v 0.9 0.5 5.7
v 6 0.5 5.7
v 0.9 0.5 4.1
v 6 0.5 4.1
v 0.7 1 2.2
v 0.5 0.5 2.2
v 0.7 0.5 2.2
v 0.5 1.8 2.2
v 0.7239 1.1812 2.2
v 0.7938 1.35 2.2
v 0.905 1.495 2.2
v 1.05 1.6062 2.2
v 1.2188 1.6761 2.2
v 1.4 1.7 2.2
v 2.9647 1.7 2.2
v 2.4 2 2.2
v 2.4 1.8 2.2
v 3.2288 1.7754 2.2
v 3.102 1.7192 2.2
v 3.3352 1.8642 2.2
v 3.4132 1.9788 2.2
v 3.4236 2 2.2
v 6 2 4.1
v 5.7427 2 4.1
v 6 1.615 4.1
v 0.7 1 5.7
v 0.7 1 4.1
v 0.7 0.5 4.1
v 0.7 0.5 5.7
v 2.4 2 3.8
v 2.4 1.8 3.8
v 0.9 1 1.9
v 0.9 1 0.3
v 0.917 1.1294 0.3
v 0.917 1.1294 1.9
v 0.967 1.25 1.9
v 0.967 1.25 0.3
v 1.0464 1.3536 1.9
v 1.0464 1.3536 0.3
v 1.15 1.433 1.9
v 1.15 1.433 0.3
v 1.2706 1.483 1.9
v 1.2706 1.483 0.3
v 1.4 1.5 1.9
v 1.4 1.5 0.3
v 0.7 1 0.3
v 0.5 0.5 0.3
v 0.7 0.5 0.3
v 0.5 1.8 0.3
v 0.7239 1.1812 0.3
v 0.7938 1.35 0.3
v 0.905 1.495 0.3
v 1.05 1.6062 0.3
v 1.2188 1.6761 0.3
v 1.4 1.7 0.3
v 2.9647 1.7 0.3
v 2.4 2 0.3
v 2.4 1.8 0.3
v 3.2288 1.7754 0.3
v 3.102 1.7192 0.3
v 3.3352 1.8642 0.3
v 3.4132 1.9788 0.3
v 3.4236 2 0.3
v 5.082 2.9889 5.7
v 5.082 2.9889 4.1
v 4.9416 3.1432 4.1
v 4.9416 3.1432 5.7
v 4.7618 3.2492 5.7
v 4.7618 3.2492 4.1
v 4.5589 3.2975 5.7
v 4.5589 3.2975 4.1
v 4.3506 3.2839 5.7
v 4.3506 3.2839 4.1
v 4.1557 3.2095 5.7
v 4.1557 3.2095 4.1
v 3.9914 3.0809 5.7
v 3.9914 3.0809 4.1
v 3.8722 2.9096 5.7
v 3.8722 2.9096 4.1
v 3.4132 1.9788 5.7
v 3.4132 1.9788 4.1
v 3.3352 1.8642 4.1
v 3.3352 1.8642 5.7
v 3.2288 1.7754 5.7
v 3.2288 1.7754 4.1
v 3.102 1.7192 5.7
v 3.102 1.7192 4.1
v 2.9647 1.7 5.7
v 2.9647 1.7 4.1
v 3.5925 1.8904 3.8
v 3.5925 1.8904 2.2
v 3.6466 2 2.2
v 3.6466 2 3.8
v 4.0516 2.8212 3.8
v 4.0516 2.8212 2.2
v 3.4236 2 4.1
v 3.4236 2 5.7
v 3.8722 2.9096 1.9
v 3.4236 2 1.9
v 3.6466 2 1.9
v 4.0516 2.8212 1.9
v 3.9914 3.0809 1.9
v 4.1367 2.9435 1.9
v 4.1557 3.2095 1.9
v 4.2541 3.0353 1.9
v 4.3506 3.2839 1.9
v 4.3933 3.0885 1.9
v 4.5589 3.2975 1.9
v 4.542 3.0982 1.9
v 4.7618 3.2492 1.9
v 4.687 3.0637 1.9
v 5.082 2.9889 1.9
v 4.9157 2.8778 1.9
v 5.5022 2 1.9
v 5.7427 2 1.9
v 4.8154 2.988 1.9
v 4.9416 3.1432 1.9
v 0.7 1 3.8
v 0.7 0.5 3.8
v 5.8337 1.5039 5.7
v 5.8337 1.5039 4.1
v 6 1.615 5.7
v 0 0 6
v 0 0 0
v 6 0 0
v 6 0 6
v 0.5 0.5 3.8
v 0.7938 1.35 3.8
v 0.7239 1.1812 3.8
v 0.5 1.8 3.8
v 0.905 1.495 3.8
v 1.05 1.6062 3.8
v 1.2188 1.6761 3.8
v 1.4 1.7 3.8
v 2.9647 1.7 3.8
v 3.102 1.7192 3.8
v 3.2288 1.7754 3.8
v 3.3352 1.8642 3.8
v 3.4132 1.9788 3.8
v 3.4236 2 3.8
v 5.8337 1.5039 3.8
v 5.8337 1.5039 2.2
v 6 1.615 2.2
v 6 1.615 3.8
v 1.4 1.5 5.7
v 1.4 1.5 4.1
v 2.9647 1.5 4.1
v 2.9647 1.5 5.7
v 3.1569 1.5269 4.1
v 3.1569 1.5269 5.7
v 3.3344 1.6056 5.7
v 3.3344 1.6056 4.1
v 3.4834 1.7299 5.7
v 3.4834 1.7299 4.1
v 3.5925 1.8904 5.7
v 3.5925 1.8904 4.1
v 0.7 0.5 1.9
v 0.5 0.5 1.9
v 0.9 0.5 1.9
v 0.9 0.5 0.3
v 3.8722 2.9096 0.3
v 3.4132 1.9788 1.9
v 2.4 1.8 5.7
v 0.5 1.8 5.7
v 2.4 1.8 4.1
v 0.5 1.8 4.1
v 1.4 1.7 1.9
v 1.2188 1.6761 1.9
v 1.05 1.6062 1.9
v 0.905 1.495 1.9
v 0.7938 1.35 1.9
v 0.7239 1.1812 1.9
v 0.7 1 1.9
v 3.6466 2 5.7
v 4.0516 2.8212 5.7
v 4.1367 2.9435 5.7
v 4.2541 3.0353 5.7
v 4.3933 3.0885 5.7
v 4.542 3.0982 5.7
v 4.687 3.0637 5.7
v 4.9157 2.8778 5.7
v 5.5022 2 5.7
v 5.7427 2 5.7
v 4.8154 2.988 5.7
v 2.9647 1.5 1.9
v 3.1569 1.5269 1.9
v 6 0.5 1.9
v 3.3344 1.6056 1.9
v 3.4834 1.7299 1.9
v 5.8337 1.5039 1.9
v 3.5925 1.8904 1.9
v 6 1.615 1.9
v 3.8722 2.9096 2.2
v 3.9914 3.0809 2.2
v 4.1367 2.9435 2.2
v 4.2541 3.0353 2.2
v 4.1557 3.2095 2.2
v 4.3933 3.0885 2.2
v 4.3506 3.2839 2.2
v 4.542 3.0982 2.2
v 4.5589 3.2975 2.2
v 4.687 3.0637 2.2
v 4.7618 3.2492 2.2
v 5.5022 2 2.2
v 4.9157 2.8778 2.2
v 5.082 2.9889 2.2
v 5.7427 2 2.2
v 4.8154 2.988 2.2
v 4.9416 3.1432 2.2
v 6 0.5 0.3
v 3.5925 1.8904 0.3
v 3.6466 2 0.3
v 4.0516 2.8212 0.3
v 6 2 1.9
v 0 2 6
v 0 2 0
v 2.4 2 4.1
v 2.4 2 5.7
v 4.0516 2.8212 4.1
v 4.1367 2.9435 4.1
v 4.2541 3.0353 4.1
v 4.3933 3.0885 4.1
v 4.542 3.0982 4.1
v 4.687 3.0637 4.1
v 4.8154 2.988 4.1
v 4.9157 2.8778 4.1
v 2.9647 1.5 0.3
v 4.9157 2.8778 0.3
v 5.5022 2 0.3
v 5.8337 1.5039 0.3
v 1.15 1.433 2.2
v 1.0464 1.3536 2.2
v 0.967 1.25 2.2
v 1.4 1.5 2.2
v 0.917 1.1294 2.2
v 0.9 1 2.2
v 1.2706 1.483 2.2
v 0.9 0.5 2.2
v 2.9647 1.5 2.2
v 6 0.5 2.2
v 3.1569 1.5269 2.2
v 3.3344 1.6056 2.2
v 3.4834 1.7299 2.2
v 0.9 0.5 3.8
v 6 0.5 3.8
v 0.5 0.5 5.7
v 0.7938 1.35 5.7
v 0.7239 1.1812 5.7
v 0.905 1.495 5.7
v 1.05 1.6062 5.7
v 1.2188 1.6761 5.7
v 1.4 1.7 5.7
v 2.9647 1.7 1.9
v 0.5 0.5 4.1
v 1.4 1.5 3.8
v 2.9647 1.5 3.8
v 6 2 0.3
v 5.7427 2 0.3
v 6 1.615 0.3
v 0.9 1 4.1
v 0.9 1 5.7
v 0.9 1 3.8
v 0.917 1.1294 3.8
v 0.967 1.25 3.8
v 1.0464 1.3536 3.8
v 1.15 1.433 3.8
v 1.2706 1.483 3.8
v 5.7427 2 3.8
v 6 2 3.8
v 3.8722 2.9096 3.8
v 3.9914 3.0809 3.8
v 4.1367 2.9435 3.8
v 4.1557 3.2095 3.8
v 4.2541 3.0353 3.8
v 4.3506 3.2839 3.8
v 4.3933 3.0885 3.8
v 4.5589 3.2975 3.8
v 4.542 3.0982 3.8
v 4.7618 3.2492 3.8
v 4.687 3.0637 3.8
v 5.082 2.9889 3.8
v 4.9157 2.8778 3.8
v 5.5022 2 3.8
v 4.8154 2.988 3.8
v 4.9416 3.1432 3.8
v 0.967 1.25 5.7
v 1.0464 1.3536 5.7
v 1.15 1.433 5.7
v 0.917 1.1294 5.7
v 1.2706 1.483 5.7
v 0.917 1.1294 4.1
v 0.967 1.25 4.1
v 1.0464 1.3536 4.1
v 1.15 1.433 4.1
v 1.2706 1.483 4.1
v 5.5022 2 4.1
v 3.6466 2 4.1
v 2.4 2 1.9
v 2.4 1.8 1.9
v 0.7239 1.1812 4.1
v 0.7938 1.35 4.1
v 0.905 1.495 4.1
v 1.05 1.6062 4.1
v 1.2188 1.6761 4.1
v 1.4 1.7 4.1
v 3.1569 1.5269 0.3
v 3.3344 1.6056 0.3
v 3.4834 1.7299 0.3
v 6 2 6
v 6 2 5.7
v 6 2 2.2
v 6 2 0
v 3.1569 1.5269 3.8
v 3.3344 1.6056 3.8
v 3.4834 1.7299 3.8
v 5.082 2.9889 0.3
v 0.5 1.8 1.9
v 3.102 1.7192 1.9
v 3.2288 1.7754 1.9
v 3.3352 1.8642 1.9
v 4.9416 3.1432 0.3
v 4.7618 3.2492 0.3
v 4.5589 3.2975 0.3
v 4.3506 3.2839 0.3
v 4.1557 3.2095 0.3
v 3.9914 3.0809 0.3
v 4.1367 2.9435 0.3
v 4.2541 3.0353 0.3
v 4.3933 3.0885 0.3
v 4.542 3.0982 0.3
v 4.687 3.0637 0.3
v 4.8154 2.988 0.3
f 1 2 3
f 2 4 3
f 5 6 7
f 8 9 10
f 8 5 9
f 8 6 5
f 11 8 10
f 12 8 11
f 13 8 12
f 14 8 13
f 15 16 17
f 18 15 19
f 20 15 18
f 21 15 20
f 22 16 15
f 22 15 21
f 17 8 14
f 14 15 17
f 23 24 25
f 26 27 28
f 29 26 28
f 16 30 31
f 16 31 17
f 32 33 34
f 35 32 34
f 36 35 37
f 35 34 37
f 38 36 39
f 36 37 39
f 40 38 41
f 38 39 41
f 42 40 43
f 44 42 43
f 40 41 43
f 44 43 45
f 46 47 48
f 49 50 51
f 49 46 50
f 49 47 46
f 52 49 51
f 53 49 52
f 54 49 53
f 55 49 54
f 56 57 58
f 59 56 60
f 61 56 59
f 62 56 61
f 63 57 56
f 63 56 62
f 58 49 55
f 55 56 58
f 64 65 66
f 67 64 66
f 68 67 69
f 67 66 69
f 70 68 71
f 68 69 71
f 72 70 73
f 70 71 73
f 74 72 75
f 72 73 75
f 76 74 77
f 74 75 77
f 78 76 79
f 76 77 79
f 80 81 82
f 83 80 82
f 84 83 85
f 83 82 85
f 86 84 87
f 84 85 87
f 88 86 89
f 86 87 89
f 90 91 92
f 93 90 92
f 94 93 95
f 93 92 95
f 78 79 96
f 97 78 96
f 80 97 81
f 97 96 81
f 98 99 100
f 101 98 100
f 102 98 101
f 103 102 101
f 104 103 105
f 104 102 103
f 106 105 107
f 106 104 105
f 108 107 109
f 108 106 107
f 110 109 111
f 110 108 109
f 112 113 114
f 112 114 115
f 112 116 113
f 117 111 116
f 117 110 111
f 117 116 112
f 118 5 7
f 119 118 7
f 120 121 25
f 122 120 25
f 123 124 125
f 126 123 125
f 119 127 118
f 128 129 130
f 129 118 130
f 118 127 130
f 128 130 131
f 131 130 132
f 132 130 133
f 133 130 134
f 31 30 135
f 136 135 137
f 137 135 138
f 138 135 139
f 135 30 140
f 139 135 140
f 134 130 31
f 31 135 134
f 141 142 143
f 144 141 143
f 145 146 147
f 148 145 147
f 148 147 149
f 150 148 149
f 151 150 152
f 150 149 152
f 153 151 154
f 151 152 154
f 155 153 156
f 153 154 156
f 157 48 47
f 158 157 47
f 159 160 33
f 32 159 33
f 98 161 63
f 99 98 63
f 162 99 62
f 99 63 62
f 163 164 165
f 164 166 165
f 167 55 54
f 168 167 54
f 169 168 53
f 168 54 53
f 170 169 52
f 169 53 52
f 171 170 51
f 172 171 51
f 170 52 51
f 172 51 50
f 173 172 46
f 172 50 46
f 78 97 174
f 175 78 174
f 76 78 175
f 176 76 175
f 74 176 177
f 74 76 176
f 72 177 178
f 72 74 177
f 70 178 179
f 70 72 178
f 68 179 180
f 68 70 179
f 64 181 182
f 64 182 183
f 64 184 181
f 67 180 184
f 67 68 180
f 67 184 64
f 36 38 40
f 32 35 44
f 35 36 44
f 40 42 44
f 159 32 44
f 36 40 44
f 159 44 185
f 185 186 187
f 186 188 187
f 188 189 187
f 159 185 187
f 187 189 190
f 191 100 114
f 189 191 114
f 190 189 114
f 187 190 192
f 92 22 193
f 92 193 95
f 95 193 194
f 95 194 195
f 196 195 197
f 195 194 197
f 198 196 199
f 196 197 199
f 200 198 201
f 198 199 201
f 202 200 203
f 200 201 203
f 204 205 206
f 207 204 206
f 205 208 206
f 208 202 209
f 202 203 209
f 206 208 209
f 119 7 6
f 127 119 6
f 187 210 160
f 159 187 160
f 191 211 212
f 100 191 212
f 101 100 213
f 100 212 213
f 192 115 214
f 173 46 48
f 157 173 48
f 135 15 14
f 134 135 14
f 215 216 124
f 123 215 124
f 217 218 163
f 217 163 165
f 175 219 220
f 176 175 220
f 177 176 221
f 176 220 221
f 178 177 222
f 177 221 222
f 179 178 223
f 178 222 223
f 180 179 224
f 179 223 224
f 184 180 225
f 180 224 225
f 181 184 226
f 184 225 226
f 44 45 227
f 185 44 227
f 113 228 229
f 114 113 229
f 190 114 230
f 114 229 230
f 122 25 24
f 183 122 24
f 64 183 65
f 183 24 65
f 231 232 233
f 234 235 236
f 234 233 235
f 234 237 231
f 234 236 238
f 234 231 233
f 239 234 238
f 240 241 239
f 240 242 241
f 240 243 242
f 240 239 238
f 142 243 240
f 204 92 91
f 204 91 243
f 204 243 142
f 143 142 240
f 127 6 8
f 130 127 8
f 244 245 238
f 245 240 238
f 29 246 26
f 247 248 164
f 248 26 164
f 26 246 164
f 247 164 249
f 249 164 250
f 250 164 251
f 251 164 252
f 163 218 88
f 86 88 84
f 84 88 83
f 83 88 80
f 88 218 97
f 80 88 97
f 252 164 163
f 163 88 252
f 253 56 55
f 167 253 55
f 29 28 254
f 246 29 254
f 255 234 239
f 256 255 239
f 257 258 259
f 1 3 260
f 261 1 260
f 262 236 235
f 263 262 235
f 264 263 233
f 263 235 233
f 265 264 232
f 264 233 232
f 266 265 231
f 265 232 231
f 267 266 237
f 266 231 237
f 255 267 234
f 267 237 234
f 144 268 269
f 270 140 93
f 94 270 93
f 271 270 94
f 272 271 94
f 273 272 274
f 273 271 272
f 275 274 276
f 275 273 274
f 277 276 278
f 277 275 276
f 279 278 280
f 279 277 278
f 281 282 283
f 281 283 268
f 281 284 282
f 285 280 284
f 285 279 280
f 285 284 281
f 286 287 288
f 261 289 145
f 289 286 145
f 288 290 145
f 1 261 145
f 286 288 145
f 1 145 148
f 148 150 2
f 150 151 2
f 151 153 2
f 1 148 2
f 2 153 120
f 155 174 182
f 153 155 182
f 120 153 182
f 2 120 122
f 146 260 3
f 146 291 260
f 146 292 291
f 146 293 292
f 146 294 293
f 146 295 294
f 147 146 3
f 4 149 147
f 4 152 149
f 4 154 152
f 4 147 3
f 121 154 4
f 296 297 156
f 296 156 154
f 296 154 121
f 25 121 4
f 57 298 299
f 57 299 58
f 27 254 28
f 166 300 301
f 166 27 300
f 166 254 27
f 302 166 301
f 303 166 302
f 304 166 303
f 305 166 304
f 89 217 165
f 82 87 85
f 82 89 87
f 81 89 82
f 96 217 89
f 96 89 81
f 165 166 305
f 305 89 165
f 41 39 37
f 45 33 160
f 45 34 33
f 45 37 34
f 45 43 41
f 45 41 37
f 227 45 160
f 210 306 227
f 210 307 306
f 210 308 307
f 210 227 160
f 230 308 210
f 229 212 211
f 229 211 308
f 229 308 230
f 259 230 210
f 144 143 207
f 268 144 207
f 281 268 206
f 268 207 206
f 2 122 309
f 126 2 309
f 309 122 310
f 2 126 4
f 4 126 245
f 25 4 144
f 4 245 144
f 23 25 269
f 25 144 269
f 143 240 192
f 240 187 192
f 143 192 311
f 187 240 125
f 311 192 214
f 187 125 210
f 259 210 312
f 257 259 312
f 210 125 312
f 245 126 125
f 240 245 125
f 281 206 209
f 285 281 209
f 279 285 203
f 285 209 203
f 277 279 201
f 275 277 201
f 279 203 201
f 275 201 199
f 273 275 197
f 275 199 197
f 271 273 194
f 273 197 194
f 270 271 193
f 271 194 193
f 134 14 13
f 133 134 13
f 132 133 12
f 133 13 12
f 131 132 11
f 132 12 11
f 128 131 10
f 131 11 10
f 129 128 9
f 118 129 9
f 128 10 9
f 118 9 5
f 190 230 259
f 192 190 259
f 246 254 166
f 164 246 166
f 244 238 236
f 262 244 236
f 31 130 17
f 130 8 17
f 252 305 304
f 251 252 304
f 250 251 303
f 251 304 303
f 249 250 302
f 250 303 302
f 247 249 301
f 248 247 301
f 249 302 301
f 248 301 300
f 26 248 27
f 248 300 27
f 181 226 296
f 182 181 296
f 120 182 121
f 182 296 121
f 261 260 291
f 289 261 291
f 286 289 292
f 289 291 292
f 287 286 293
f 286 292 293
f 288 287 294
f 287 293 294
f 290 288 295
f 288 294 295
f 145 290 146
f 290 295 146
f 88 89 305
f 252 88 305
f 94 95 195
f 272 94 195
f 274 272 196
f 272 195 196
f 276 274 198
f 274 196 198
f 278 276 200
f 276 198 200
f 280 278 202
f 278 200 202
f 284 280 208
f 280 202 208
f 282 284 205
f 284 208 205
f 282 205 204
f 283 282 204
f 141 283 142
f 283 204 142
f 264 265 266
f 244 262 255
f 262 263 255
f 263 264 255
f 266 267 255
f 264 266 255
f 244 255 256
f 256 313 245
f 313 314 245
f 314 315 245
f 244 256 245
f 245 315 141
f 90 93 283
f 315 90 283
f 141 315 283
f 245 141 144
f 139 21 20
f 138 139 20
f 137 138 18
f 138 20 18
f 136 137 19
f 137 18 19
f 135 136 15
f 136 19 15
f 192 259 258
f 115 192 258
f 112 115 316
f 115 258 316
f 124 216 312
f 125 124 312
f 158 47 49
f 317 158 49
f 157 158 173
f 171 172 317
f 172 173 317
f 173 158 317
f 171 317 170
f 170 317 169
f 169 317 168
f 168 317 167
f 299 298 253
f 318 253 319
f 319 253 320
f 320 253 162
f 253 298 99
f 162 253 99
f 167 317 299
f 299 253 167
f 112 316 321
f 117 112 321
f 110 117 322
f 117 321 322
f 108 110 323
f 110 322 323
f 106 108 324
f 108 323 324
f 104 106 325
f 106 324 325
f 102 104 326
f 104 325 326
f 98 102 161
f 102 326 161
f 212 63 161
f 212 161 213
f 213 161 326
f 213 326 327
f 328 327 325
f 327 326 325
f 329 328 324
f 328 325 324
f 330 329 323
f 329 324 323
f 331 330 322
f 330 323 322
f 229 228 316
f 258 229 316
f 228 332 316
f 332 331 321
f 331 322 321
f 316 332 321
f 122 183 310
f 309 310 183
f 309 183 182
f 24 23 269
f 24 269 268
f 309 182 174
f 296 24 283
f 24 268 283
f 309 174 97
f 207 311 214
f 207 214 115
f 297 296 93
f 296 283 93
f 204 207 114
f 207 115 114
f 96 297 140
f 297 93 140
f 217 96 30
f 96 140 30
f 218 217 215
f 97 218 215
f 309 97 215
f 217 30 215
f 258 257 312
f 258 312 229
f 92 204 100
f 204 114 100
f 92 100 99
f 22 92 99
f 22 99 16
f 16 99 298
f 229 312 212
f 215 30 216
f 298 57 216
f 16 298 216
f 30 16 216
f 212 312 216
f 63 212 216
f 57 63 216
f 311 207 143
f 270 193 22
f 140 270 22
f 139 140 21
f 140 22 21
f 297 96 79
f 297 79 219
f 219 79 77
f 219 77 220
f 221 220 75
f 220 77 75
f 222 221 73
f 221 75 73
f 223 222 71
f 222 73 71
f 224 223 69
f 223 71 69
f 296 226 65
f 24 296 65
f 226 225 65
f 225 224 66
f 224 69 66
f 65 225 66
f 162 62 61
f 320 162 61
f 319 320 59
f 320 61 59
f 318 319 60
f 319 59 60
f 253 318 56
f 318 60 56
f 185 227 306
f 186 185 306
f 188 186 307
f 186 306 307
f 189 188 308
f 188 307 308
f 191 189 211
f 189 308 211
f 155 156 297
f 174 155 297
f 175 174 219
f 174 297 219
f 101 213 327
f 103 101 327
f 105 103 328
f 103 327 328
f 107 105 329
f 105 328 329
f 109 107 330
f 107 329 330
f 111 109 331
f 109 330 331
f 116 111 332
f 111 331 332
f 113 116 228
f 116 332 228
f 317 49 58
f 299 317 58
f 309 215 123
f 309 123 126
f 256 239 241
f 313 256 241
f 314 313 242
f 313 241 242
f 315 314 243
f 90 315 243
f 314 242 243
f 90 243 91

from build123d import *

# Parameters (mm, degrees)
BOSS_EXTRUDE1_DEPTH = 6
BOSS_EXTRUDE2_START = 0.3
BOSS_EXTRUDE2_DEPTH = 1.6
SKETCH1_3_W         = 5
SKETCH1_3_H         = 1
BOSS_EXTRUDE3_DEPTH = 0.3
BOSS_EXTRUDE4_START = 1.9
SKETCH1_5_W         = 5
SKETCH1_5_H         = 1
BOSS_EXTRUDE4_DEPTH = 0.3
BOSS_EXTRUDE5_START = 2.2
BOSS_EXTRUDE5_DEPTH = 1.6
BOSS_EXTRUDE6_START = 3.8
SKETCH1_6_W         = 5
SKETCH1_6_H         = 1
BOSS_EXTRUDE6_DEPTH = 0.3
BOSS_EXTRUDE7_START = 4.1
BOSS_EXTRUDE7_DEPTH = 1.6
BOSS_EXTRUDE8_START = 5.7
SKETCH1_7_W         = 5
SKETCH1_7_H         = 1
BOSS_EXTRUDE8_DEPTH = 0.3
SKETCH3_W           = 2.4
SKETCH3_H           = 6
BOSS_EXTRUDE9_DEPTH = 0.2


with BuildPart() as part:
    # Sketch1 → Boss-Extrude1 (new body)
    with BuildSketch(Plane.XY):
        Polygon((5.5, 0.5), (0.5, 0.5), (0.5, 1.5), (0.5, 2), (0, 2), (0, 0), (6, 0), (6, 0.5), align=None)
    extrude(amount=BOSS_EXTRUDE1_DEPTH)

    # Sketch2 → Boss-Extrude2 (add)
    with BuildSketch(Plane.XY.offset(BOSS_EXTRUDE2_START)):
        with BuildLine():
            Line((5.833702875, 1.503863094), (6, 1.614972348))
            Line((6, 1.614972348), (5.082039937, 2.988882388))
            ThreePointArc((5.082039937, 2.988882388), (4.454237941, 3.298502565), (3.872198004, 2.909620177))
            Line((3.872198004, 2.909620177), (3.413156013, 1.97884273))
            ThreePointArc((3.413156013, 1.97884273), (3.228753823, 1.775395104), (2.964726016, 1.7))
            Line((2.964726016, 1.7), (1.4, 1.7))
            ThreePointArc((1.4, 1.7), (0.905025253, 1.494974747), (0.7, 1))
            Line((0.7, 1), (0.7, 0.5))
            Line((0.7, 0.5), (0.9, 0.5))
            Line((0.9, 0.5), (0.9, 1))
            ThreePointArc((0.9, 1), (1.046446609, 1.353553391), (1.4, 1.5))
            Line((1.4, 1.5), (2.964726016, 1.5))
            ThreePointArc((2.964726016, 1.5), (3.334364945, 1.605553146), (3.592528012, 1.890379823))
            Line((3.592528012, 1.890379823), (4.051570003, 2.82115727))
            ThreePointArc((4.051570003, 2.82115727), (4.467312815, 3.098930404), (4.915742812, 2.877773134))
            Line((4.915742812, 2.877773134), (5.833702875, 1.503863094))
        make_face()
    extrude(amount=BOSS_EXTRUDE2_DEPTH)

    # Sketch1<3> → Boss-Extrude3 (add)
    with BuildSketch(Plane.XY):
        with Locations((3, 1)):
            Rectangle(SKETCH1_3_W, SKETCH1_3_H)
        Polygon((0.5, 2), (0.5, 1.5), (5.5, 1.5), (5.5, 0.5), (6, 0.5), (6, 2), align=None)
    extrude(amount=BOSS_EXTRUDE3_DEPTH)

    # Sketch1<5> → Boss-Extrude4 (add)
    with BuildSketch(Plane.XY.offset(BOSS_EXTRUDE4_START)):
        Polygon((0.5, 2), (0.5, 1.5), (5.5, 1.5), (5.5, 0.5), (6, 0.5), (6, 2), align=None)
        with Locations((3, 1)):
            Rectangle(SKETCH1_5_W, SKETCH1_5_H)
    extrude(amount=BOSS_EXTRUDE4_DEPTH)

    # Sketch2<3> → Boss-Extrude5 (add)
    with BuildSketch(Plane.XY.offset(BOSS_EXTRUDE5_START)):
        with BuildLine():
            Line((5.833702875, 1.503863094), (6, 1.614972348))
            Line((6, 1.614972348), (5.082039937, 2.988882388))
            ThreePointArc((5.082039937, 2.988882388), (4.454237941, 3.298502565), (3.872198004, 2.909620177))
            Line((3.872198004, 2.909620177), (3.413156013, 1.97884273))
            ThreePointArc((3.413156013, 1.97884273), (3.228753823, 1.775395104), (2.964726016, 1.7))
            Line((2.964726016, 1.7), (1.4, 1.7))
            ThreePointArc((1.4, 1.7), (0.905025253, 1.494974747), (0.7, 1))
            Line((0.7, 1), (0.7, 0.5))
            Line((0.7, 0.5), (0.9, 0.5))
            Line((0.9, 0.5), (0.9, 1))
            ThreePointArc((0.9, 1), (1.046446609, 1.353553391), (1.4, 1.5))
            Line((1.4, 1.5), (2.964726016, 1.5))
            ThreePointArc((2.964726016, 1.5), (3.334364945, 1.605553146), (3.592528012, 1.890379823))
            Line((3.592528012, 1.890379823), (4.051570003, 2.82115727))
            ThreePointArc((4.051570003, 2.82115727), (4.467312815, 3.098930404), (4.915742812, 2.877773134))
            Line((4.915742812, 2.877773134), (5.833702875, 1.503863094))
        make_face()
    extrude(amount=BOSS_EXTRUDE5_DEPTH)

    # Sketch1<6> → Boss-Extrude6 (add)
    with BuildSketch(Plane.XY.offset(BOSS_EXTRUDE6_START)):
        with Locations((3, 1)):
            Rectangle(SKETCH1_6_W, SKETCH1_6_H)
        Polygon((0.5, 2), (0.5, 1.5), (5.5, 1.5), (5.5, 0.5), (6, 0.5), (6, 2), align=None)
    extrude(amount=BOSS_EXTRUDE6_DEPTH)

    # Sketch2<4> → Boss-Extrude7 (add)
    with BuildSketch(Plane.XY.offset(BOSS_EXTRUDE7_START)):
        with BuildLine():
            Line((5.833702875, 1.503863094), (6, 1.614972348))
            Line((6, 1.614972348), (5.082039937, 2.988882388))
            ThreePointArc((5.082039937, 2.988882388), (4.454237941, 3.298502565), (3.872198004, 2.909620177))
            Line((3.872198004, 2.909620177), (3.413156013, 1.97884273))
            ThreePointArc((3.413156013, 1.97884273), (3.228753823, 1.775395104), (2.964726016, 1.7))
            Line((2.964726016, 1.7), (1.4, 1.7))
            ThreePointArc((1.4, 1.7), (0.905025253, 1.494974747), (0.7, 1))
            Line((0.7, 1), (0.7, 0.5))
            Line((0.7, 0.5), (0.9, 0.5))
            Line((0.9, 0.5), (0.9, 1))
            ThreePointArc((0.9, 1), (1.046446609, 1.353553391), (1.4, 1.5))
            Line((1.4, 1.5), (2.964726016, 1.5))
            ThreePointArc((2.964726016, 1.5), (3.334364945, 1.605553146), (3.592528012, 1.890379823))
            Line((3.592528012, 1.890379823), (4.051570003, 2.82115727))
            ThreePointArc((4.051570003, 2.82115727), (4.467312815, 3.098930404), (4.915742812, 2.877773134))
            Line((4.915742812, 2.877773134), (5.833702875, 1.503863094))
        make_face()
    extrude(amount=BOSS_EXTRUDE7_DEPTH)

    # Sketch1<7> → Boss-Extrude8 (add)
    with BuildSketch(Plane.XY.offset(BOSS_EXTRUDE8_START)):
        Polygon((0.5, 2), (0.5, 1.5), (5.5, 1.5), (5.5, 0.5), (6, 0.5), (6, 2), align=None)
        with Locations((3, 1)):
            Rectangle(SKETCH1_7_W, SKETCH1_7_H)
    extrude(amount=BOSS_EXTRUDE8_DEPTH)

    # Sketch3 → Boss-Extrude9 (add)
    with BuildSketch(Plane(origin=(0, 2, 0), x_dir=(1, 0, 0), z_dir=(0, 1, 0))):
        with Locations((1.2, -3)):
            Rectangle(SKETCH3_W, SKETCH3_H)
    extrude(amount=-BOSS_EXTRUDE9_DEPTH)


solid = part.part
